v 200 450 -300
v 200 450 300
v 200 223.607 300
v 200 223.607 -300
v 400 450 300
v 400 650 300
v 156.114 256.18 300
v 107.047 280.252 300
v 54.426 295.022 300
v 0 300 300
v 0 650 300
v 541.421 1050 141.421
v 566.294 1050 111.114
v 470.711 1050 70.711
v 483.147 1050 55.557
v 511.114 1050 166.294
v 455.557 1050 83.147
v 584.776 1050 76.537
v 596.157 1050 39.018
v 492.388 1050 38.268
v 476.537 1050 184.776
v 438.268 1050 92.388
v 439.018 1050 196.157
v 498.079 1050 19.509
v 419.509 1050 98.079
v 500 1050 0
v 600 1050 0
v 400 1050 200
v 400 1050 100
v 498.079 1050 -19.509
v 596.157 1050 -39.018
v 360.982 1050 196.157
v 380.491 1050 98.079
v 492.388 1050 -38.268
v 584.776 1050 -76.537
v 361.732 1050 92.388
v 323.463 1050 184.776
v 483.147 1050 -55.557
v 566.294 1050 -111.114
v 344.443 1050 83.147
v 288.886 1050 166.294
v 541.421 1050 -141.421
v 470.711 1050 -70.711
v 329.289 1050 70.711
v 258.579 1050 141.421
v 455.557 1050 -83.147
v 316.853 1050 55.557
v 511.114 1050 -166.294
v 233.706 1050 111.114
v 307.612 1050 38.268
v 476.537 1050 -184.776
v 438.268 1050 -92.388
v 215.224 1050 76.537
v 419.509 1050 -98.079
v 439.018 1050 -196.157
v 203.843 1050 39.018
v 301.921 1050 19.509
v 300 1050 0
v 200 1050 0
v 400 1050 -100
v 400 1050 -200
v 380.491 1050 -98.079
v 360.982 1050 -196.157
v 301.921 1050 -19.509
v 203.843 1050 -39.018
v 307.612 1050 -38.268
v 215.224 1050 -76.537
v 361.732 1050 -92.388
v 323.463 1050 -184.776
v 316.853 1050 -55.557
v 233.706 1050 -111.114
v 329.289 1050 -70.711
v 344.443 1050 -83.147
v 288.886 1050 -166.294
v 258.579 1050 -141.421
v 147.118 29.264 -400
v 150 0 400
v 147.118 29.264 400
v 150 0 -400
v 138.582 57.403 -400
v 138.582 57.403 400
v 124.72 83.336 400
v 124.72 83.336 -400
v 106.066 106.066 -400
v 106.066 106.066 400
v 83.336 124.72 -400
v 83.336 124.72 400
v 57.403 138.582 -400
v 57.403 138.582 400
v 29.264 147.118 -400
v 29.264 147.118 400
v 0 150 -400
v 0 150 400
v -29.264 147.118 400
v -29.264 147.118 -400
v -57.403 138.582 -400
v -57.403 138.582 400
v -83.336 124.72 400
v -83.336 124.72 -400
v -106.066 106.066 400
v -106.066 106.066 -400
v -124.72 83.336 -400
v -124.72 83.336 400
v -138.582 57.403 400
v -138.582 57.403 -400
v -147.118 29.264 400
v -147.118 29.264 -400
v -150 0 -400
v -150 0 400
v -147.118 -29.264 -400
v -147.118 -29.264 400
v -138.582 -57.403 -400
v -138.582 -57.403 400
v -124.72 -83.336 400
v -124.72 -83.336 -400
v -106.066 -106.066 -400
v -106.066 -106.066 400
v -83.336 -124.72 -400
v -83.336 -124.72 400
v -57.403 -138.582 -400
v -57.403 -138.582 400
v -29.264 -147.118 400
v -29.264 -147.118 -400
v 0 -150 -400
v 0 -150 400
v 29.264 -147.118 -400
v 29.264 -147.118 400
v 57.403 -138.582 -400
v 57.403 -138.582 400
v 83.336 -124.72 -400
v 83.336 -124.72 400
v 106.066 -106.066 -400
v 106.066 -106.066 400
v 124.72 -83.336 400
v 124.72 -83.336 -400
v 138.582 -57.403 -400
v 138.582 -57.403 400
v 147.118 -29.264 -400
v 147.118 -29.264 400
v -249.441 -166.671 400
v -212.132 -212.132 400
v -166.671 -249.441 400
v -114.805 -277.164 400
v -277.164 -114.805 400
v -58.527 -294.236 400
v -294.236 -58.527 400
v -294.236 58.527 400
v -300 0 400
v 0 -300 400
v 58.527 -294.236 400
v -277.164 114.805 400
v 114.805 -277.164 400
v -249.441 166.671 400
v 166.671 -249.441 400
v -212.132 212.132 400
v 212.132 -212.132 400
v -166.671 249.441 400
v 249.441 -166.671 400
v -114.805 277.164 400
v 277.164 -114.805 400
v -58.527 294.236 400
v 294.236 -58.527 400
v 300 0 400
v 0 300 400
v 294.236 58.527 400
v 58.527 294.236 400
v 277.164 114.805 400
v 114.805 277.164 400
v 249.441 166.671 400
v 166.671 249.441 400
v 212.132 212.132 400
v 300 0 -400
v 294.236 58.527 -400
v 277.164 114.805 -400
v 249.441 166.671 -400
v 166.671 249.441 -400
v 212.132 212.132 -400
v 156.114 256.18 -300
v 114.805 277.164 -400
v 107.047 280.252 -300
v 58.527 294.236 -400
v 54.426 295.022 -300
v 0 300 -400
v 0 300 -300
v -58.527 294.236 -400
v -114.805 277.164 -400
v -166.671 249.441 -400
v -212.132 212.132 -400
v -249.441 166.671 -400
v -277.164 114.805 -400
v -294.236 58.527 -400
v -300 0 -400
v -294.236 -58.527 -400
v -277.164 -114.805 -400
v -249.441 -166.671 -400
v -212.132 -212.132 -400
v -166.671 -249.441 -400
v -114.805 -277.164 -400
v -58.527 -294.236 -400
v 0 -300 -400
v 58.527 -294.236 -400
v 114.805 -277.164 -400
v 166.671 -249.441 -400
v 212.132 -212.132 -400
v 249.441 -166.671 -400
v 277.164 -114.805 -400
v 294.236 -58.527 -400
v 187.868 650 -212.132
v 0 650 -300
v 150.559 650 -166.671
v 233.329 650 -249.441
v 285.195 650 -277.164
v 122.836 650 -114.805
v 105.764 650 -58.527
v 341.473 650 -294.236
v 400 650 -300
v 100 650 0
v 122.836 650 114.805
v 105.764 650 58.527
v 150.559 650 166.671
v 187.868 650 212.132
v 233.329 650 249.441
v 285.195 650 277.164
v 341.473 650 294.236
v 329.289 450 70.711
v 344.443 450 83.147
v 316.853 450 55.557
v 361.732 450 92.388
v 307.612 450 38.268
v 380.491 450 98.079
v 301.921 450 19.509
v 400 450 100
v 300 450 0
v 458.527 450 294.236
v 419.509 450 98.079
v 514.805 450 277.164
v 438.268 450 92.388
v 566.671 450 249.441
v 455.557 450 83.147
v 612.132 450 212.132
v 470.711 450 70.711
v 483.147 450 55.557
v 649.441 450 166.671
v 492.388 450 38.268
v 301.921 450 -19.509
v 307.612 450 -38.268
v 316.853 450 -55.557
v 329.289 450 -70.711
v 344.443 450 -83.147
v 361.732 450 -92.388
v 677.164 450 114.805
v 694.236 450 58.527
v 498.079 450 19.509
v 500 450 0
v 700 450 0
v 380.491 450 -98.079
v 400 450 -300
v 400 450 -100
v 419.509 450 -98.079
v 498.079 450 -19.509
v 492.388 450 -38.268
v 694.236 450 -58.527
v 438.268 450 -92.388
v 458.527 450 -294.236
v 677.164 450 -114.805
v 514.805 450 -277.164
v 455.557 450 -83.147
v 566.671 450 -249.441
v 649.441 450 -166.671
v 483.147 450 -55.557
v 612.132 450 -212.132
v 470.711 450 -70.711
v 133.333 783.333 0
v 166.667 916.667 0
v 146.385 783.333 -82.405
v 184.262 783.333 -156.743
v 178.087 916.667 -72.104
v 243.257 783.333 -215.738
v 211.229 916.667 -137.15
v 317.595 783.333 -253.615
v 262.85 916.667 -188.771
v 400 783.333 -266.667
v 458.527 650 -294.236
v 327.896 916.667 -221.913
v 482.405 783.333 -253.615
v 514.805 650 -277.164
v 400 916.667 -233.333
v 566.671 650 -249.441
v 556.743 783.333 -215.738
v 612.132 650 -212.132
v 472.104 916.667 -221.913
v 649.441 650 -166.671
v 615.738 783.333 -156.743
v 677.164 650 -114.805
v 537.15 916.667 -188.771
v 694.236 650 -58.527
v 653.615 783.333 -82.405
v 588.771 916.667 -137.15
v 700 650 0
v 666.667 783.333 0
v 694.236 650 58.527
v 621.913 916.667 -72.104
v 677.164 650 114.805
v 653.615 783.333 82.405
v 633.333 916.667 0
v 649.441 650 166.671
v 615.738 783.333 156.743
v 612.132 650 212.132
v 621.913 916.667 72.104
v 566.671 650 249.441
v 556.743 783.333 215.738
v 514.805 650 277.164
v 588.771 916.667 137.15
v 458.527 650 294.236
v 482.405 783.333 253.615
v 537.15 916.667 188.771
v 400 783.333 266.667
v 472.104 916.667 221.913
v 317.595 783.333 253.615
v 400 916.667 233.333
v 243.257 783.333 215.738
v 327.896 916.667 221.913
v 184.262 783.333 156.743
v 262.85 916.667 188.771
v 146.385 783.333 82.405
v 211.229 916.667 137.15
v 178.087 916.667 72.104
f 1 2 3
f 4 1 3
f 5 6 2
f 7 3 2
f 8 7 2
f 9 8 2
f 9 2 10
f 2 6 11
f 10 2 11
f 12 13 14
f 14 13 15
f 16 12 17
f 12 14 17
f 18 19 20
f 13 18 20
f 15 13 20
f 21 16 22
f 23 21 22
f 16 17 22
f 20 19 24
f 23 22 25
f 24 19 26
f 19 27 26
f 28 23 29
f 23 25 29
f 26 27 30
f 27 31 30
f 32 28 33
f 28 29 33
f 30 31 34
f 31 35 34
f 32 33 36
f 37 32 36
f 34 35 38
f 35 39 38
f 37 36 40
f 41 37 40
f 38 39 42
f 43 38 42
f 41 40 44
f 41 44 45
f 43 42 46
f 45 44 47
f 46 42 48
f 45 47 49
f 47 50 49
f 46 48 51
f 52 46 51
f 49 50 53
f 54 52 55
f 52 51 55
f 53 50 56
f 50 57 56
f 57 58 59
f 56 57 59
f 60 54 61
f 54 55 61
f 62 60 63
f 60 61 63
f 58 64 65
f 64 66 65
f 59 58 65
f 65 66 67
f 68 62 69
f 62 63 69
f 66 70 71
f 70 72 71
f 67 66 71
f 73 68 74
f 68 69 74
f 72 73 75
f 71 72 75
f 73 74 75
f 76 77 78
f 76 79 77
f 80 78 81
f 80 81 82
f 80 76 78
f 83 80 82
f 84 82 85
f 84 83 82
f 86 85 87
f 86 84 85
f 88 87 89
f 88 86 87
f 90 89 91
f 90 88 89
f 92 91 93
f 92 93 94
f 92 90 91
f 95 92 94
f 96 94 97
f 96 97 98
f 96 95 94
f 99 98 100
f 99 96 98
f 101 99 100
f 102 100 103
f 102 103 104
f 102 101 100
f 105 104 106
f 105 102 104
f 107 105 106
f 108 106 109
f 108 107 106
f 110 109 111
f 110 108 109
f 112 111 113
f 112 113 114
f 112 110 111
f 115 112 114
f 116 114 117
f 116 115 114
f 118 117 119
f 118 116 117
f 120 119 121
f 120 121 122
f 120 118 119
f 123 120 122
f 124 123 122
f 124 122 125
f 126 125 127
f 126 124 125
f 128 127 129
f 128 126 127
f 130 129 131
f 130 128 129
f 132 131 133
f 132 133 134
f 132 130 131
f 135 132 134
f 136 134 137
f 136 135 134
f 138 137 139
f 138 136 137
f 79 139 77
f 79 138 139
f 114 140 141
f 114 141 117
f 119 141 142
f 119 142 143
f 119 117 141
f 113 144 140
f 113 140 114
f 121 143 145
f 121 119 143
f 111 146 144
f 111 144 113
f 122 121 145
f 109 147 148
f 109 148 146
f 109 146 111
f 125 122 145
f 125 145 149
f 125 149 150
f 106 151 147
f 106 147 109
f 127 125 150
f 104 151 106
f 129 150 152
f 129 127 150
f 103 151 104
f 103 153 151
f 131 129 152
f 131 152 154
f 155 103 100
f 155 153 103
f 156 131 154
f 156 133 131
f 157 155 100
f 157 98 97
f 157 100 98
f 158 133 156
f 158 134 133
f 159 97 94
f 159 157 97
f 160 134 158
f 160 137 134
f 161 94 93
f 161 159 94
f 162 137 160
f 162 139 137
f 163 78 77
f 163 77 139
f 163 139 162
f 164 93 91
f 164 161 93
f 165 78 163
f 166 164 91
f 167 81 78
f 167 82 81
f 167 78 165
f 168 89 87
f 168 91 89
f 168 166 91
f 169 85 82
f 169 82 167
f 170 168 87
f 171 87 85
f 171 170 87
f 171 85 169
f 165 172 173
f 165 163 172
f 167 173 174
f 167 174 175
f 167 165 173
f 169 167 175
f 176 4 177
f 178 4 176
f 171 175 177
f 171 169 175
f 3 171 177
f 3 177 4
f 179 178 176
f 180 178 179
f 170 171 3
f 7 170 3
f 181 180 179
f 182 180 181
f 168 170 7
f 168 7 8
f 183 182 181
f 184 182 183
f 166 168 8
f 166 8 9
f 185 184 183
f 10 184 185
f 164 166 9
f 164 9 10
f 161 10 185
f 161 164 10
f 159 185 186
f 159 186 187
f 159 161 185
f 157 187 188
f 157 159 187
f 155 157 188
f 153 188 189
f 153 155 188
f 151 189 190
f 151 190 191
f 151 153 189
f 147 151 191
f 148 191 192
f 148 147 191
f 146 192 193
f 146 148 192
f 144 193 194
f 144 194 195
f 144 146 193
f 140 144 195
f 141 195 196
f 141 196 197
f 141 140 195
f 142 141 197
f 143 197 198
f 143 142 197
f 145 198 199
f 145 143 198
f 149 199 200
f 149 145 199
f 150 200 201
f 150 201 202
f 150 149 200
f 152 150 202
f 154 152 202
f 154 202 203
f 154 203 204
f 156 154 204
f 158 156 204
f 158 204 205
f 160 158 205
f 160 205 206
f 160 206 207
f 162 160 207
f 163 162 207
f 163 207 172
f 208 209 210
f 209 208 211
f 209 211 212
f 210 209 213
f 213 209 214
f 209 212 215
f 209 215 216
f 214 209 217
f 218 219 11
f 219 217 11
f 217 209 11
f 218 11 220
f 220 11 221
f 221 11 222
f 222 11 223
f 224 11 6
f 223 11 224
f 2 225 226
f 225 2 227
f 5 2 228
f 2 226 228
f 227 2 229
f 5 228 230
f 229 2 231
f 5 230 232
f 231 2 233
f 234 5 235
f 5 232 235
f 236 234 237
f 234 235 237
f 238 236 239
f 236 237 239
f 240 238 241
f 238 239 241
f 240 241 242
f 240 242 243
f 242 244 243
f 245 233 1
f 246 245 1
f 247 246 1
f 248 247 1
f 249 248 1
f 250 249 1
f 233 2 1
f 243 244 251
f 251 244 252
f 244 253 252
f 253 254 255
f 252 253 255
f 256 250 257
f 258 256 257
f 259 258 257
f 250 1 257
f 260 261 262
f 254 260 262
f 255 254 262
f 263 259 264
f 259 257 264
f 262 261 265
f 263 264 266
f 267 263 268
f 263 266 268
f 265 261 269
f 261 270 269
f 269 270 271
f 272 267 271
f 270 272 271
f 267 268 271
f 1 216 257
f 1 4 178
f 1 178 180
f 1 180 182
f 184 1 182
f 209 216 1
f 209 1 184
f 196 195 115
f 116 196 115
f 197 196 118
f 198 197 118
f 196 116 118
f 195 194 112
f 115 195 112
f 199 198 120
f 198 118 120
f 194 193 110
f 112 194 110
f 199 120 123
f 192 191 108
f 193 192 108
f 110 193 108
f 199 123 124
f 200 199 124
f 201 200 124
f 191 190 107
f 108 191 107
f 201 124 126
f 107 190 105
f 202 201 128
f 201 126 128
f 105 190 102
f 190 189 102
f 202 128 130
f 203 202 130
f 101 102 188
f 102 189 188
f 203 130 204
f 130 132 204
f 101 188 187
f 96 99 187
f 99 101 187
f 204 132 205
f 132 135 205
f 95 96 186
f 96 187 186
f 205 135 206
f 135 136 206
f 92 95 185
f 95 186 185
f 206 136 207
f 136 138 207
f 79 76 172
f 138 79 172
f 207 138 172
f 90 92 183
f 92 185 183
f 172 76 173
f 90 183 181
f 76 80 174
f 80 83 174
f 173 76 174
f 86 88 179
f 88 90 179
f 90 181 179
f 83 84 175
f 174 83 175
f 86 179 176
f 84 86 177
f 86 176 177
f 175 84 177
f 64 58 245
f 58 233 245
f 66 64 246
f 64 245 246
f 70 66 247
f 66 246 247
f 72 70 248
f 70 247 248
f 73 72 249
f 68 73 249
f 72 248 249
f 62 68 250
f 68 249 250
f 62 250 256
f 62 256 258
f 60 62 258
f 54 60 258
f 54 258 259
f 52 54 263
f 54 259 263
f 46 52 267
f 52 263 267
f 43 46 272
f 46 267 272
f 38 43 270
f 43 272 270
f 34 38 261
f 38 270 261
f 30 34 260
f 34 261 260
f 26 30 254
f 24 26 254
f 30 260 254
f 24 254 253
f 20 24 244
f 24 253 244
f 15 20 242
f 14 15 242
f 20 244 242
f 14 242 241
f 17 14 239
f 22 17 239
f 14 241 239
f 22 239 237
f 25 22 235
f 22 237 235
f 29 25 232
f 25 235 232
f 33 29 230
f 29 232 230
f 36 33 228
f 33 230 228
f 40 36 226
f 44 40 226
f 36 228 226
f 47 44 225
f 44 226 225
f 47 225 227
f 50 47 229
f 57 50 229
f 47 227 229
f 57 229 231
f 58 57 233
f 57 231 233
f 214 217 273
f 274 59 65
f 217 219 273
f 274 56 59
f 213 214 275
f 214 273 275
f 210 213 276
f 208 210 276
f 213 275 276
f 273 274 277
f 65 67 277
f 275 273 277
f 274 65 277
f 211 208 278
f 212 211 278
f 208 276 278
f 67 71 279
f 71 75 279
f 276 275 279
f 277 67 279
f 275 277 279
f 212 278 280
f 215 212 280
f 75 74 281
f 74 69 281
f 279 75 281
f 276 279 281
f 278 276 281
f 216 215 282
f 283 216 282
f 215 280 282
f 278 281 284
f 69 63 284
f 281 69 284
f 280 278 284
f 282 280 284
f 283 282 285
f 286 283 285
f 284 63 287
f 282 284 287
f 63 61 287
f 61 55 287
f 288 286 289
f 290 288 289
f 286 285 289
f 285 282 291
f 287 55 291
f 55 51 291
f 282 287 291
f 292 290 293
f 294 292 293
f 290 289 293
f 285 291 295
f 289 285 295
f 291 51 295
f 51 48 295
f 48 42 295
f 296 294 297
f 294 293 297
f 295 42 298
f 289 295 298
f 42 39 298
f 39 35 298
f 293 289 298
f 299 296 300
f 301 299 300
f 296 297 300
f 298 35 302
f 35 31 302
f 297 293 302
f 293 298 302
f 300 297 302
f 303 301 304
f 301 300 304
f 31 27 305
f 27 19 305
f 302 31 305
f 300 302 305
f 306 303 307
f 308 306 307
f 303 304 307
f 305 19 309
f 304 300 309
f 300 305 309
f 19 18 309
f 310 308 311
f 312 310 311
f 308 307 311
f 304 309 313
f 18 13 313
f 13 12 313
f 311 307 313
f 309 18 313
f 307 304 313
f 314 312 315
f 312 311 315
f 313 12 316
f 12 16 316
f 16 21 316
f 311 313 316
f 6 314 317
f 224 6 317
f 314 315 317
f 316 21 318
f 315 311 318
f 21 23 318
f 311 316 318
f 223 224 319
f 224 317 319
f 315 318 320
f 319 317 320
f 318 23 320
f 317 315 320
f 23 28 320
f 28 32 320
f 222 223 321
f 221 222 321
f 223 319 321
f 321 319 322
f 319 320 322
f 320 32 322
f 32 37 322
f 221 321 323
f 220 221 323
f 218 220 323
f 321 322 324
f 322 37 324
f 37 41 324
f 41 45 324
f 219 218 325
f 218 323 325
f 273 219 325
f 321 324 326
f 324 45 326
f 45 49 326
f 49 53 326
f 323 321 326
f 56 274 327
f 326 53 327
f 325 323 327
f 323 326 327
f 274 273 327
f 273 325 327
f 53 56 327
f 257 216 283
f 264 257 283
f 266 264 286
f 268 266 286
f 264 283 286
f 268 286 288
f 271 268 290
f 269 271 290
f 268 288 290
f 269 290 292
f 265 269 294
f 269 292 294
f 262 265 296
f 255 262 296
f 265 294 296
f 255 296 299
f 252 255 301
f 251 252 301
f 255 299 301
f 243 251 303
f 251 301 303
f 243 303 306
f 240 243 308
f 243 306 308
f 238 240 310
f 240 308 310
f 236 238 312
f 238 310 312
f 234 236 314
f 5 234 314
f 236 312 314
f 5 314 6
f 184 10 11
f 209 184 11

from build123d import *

# Parameters (mm, degrees)
SKETCH1_R           = 300
SKETCH1_R_2         = 150
BOSS_EXTRUDE1_DEPTH = 400
BOSS_EXTRUDE2_DEPTH = 300
SKETCH6_R           = 100
CUT_EXTRUDE1_DEPTH  = 951


with BuildPart() as part:
    # Sketch1 → Boss-Extrude1 (new body, symmetric)
    with BuildSketch(Plane.XY):
        Circle(SKETCH1_R)
        Circle(SKETCH1_R_2, mode=Mode.SUBTRACT)
    extrude(amount=BOSS_EXTRUDE1_DEPTH, both=True)

    # Sketch2 → Boss-Extrude2 (add, symmetric)
    with BuildSketch(Plane.XY):
        with BuildLine():
            Line((0, 300), (0, 650))
            Line((0, 650), (400, 650))
            Line((400, 650), (400, 450))
            Line((400, 450), (200, 450))
            Line((200, 450), (200, 223.60679775))
            ThreePointArc((200, 223.60679775), (107.046626932, 280.251707689), (0, 300))
        make_face()
    extrude(amount=BOSS_EXTRUDE2_DEPTH, both=True)

    # Sketch5 → Revolve1 (revolve)
    with BuildSketch(Plane.XY, mode=Mode.PRIVATE) as revolve1_sk:
        Polygon((500, 1050), (500, 450), (700, 450), (700, 650), (600, 1050), align=None)
    revolve(revolve1_sk.sketch.rotate(Axis((400, 1046.547462699, 0), (0, -1, 0)), 180), axis=Axis((400, 1046.547462699, 0), (0, -1, 0)))  # turned: the seam where the file's is

    # Sketch6 → Cut-Extrude1 (cut, through all)
    with BuildSketch(Plane(origin=(0, 650, 0), x_dir=(1, 0, 0), z_dir=(0, 1, 0))):
        with Locations(Location((400, 0, 0), (0, 0, 180))):  # turned: the seam where the file's is
            Circle(SKETCH6_R)
    extrude(amount=-CUT_EXTRUDE1_DEPTH, mode=Mode.SUBTRACT)


solid = part.part
